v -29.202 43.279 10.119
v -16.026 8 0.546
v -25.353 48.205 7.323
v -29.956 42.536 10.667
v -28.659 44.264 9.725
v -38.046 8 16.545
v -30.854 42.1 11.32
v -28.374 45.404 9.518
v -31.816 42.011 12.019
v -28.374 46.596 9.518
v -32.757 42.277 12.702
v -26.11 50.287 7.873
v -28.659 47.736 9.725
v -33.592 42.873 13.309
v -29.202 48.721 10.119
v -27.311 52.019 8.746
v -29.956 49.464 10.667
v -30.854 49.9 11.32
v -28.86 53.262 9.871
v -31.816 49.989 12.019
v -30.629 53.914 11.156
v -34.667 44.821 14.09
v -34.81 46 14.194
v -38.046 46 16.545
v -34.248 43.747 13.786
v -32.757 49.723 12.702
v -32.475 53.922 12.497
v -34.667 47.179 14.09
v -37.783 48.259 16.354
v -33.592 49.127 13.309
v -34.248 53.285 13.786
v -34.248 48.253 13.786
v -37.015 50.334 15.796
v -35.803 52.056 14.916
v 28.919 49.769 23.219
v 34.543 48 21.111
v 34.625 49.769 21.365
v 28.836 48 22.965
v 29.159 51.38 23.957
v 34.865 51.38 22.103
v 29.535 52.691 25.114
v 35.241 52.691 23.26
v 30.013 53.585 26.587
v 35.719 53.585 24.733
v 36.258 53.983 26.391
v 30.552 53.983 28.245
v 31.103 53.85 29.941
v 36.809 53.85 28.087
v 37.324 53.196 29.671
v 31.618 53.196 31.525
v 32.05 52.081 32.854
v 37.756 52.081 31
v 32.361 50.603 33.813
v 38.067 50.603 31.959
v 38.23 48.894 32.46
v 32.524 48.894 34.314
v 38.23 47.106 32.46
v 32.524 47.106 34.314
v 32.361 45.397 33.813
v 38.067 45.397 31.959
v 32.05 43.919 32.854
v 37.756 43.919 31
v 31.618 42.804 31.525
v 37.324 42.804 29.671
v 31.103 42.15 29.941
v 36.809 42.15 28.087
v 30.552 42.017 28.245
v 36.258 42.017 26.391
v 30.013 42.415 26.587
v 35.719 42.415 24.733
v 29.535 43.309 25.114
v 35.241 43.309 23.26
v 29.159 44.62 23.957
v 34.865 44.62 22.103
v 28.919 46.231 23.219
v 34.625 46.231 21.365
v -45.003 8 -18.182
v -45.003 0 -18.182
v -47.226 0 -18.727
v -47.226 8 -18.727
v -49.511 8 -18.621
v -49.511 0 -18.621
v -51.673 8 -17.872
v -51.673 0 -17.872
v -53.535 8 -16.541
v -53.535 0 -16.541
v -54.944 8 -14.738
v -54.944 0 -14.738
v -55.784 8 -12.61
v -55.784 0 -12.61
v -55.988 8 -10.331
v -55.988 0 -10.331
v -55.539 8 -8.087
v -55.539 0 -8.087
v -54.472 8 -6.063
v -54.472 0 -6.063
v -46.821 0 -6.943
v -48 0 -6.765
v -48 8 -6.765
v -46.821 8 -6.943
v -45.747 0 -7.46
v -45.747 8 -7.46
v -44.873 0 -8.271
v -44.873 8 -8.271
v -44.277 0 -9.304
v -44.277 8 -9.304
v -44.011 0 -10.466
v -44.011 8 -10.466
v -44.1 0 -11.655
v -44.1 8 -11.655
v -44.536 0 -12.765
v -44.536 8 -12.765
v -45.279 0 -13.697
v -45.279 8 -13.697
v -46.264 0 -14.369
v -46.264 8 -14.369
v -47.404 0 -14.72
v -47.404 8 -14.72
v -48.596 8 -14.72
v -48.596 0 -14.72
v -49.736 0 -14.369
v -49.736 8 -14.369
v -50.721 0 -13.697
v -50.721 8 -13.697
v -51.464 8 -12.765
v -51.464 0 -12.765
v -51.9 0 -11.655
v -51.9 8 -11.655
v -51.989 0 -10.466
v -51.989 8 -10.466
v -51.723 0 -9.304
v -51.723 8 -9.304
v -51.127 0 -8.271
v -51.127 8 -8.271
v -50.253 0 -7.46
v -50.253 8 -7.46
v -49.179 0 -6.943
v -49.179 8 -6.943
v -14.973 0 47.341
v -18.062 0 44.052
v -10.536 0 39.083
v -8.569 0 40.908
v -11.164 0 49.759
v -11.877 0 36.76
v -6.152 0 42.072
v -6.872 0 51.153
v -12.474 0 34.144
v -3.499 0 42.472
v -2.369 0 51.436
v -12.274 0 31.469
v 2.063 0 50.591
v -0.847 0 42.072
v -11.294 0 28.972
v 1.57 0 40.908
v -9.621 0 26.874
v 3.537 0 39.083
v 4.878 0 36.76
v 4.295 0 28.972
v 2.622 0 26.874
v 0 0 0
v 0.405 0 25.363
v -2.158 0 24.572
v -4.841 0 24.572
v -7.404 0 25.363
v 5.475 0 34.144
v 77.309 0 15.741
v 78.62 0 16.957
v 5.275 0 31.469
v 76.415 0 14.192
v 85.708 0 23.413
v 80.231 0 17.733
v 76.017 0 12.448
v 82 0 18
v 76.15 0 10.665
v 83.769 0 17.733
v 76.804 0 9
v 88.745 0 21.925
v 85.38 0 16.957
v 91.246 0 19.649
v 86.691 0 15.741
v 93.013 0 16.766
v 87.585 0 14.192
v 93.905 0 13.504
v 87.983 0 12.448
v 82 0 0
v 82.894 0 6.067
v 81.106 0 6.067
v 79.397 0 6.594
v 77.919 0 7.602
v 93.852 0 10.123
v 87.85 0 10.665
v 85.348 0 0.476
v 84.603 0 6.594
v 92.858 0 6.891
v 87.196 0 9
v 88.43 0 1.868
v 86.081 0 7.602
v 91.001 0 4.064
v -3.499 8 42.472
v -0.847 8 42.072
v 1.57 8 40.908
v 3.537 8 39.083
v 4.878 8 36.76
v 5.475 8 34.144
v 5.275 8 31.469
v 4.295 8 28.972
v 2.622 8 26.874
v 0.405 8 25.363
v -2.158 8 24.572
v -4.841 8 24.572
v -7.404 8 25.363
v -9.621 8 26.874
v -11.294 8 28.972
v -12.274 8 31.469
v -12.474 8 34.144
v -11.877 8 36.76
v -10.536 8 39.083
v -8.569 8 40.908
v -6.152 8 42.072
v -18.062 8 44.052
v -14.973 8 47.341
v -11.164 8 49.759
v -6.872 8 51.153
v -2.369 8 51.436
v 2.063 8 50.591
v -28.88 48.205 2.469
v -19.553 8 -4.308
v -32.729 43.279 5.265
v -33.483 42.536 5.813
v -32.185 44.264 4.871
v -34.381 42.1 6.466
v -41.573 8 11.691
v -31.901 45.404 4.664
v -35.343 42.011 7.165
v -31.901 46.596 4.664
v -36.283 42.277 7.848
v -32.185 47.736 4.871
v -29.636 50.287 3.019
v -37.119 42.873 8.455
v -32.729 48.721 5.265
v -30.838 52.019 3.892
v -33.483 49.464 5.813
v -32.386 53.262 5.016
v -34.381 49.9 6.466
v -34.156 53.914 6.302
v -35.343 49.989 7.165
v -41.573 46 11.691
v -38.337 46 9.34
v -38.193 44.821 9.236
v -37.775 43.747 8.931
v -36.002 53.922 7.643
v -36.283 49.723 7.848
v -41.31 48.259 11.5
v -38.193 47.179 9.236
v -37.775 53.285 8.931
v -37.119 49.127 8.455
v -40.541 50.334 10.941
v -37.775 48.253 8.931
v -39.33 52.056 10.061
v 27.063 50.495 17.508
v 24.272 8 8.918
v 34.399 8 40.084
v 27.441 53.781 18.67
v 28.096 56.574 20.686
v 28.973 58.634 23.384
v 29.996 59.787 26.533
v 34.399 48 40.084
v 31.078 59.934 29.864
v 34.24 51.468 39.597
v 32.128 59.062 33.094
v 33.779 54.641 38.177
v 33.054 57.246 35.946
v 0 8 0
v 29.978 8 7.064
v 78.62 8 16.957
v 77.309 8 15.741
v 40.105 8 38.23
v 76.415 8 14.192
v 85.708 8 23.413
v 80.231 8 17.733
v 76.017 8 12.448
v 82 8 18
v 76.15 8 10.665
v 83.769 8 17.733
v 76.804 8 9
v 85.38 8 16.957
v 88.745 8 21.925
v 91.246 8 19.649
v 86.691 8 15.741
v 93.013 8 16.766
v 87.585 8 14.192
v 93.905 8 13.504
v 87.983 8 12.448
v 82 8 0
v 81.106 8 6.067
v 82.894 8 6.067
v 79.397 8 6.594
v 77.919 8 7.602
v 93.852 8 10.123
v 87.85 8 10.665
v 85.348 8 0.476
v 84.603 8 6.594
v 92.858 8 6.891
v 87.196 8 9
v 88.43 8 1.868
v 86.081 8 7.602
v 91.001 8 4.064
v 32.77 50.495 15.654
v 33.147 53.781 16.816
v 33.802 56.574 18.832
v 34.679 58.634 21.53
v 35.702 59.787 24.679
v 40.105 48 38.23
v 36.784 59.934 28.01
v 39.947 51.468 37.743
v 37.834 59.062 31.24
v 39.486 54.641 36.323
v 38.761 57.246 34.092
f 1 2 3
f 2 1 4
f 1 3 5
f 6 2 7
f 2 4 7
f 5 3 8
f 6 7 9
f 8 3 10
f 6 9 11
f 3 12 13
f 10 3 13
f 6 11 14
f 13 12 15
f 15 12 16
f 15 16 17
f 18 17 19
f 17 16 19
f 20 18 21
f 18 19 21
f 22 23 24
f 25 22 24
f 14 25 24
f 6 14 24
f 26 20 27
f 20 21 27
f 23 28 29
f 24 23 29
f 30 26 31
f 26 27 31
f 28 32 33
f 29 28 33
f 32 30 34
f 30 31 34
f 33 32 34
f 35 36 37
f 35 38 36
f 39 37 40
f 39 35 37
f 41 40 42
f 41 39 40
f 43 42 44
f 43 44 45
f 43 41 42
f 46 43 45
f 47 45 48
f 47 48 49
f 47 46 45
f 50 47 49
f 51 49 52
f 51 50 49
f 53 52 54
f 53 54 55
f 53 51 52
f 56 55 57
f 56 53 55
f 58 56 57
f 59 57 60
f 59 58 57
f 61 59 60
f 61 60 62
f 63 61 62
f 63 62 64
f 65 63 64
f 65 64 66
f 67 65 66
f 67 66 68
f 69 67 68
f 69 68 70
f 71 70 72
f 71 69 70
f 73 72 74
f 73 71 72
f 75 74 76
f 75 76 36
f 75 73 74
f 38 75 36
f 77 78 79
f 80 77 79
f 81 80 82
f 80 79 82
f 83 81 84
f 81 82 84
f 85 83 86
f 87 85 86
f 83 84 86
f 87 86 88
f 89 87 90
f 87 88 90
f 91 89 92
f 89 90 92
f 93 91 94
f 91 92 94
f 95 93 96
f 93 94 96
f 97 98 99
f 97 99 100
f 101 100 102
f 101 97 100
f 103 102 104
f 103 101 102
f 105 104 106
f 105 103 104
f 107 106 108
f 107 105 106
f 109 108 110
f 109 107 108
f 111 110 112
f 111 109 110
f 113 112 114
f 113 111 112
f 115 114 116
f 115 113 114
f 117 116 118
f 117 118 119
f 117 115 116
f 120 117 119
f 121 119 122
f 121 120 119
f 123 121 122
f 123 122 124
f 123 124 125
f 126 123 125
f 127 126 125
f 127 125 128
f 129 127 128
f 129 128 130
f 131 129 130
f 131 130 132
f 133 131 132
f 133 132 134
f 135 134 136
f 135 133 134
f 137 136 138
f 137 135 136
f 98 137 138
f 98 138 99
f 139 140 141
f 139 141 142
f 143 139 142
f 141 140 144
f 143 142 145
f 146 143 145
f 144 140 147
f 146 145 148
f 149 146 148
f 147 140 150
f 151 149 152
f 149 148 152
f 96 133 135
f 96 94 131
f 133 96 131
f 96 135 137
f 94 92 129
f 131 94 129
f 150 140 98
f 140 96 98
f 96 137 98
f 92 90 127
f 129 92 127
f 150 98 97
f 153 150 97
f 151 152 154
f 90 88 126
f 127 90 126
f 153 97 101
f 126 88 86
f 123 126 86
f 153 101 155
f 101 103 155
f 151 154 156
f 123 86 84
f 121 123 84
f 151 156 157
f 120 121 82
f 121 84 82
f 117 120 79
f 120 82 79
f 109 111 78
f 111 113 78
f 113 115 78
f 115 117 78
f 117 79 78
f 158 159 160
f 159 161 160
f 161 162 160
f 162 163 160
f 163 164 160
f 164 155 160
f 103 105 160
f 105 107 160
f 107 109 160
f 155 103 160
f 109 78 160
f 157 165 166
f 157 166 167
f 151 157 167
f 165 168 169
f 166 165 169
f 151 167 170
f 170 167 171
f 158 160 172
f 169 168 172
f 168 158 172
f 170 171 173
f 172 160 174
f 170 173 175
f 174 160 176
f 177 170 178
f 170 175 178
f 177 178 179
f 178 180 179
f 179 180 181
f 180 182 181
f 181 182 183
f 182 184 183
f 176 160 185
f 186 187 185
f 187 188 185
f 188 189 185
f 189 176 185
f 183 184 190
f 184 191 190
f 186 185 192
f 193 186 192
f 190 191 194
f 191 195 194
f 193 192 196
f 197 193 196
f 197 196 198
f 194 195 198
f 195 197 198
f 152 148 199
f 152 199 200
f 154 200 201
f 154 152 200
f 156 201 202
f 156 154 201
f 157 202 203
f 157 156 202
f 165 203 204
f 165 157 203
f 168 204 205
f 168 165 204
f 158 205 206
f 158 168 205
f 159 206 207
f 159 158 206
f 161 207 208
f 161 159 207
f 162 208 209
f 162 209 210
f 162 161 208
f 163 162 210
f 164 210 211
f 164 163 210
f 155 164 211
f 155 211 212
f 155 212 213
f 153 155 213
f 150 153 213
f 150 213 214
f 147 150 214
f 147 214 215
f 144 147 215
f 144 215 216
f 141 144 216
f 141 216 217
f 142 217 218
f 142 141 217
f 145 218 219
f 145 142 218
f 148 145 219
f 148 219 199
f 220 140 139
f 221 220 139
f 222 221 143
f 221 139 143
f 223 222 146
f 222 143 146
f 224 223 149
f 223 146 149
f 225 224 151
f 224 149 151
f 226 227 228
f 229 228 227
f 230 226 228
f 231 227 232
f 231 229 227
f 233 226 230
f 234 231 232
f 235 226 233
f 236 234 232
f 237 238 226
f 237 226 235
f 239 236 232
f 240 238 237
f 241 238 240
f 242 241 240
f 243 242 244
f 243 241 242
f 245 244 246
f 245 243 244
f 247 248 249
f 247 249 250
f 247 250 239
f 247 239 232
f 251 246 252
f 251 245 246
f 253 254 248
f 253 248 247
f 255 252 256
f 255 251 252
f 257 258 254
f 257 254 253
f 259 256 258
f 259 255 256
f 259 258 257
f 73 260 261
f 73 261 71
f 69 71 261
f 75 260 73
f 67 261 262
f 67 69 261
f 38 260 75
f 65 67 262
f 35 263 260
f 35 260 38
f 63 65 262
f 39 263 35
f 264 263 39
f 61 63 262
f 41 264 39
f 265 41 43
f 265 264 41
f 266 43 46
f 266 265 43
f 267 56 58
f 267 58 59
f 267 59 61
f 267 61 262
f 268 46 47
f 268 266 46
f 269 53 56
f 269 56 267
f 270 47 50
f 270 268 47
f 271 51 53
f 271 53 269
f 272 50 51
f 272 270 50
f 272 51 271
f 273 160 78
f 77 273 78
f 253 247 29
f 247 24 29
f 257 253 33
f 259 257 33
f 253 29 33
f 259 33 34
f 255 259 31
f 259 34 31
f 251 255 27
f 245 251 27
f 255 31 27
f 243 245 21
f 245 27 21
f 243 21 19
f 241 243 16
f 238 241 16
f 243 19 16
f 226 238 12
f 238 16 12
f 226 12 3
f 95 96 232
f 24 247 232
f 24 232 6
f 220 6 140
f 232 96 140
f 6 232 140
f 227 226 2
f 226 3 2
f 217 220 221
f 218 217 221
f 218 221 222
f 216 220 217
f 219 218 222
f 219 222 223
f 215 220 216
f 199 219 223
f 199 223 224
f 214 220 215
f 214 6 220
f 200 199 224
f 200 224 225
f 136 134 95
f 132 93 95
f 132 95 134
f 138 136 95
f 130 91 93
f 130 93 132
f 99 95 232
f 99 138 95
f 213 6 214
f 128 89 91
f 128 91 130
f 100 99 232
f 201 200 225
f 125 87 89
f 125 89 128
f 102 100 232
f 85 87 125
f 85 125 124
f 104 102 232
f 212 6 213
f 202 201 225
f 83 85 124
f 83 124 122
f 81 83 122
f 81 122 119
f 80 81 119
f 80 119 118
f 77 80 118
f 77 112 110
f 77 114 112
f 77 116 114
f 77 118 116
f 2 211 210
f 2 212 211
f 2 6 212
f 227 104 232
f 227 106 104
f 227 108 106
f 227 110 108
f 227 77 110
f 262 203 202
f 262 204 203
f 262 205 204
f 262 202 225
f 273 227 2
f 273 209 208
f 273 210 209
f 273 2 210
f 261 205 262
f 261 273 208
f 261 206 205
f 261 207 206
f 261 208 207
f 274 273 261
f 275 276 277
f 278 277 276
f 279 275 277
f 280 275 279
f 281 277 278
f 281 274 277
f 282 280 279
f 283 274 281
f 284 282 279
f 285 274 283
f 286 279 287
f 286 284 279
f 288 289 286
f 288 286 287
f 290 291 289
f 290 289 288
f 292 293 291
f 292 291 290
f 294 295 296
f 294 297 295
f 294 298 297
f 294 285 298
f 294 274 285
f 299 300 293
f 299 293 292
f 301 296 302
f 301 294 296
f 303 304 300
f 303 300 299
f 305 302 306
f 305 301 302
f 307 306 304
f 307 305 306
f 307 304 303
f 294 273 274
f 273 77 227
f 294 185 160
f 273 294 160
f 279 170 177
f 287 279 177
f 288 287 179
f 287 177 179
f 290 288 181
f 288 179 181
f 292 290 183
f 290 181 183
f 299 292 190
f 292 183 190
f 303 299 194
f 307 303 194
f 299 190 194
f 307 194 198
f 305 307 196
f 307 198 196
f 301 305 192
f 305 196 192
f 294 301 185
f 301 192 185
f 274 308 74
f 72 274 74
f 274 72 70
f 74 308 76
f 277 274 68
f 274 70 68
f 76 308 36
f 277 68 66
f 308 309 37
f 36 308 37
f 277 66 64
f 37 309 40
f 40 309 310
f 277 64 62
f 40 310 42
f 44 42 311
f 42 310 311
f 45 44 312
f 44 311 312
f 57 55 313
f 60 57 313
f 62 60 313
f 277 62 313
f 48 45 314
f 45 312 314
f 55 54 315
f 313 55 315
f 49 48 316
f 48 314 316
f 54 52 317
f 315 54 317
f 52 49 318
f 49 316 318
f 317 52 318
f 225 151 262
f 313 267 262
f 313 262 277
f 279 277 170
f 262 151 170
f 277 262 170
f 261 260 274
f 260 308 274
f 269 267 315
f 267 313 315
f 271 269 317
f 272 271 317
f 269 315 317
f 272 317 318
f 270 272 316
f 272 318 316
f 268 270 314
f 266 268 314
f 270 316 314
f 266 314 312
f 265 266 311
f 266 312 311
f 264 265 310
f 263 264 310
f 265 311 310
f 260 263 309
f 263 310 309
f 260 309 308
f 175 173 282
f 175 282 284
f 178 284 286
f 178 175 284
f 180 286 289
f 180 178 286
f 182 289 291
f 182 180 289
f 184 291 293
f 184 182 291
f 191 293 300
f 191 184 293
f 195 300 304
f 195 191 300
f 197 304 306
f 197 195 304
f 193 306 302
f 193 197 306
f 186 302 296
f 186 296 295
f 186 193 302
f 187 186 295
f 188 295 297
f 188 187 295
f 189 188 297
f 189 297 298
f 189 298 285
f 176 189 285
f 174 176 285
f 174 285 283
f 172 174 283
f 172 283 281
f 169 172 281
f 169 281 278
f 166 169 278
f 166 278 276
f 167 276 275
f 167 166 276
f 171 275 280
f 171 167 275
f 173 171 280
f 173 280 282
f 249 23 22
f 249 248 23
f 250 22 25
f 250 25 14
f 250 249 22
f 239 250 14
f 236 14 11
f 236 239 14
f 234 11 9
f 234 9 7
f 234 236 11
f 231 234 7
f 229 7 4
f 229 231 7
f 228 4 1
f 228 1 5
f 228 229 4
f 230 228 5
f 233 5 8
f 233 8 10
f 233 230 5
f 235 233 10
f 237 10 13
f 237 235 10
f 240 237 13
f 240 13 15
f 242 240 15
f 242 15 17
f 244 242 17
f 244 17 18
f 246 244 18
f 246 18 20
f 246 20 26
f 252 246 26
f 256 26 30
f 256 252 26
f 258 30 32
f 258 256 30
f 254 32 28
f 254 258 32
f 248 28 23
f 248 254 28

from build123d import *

# Parameters (mm, degrees)
SKETCH1_R           = 4
SKETCH1_R_2         = 6
SKETCH1_R_3         = 9
BOSS_EXTRUDE1_DEPTH = 8
SKETCH2_R           = 4
BOSS_EXTRUDE2_DEPTH = 3
SKETCH3_R           = 6
BOSS_EXTRUDE3_DEPTH = 3


with BuildPart() as part:
    # Sketch1 → Boss-Extrude1 (new body)
    with BuildSketch(Plane(origin=(0, 0, 0), x_dir=(1, 0, 0), z_dir=(0, 1, 0))):
        with BuildLine():
            Line((82, 0), (0, 0))
            Line((0, 0), (-45.003147253, 18.182451735))
            ThreePointArc((-45.003147253, 18.182451735), (-54.304086029, 15.690272701), (-54.472135955, 6.06269888))
            Line((-54.472135955, 6.06269888), (-18.061799059, -44.051830542))
            ThreePointArc((-18.061799059, -44.051830542), (-9.061799059, -50.590713294), (2.062812738, -50.590713294))
            Line((2.062812738, -50.590713294), (85.708203932, -23.412678196))
            ThreePointArc((85.708203932, -23.412678196), (93.852260087, -10.12278642), (82, 0))
        make_face()
        with Locations(Location((-48, 10.764980899, 0), (0, 0, 270))):
            Circle(SKETCH1_R, mode=Mode.SUBTRACT)
        with Locations(Location((82, -12, 0), (0, 0, 270))):
            Circle(SKETCH1_R_2, mode=Mode.SUBTRACT)
        with Locations(Location((-3.49949316, -33.471696, 0), (0, 0, 270))):
            Circle(SKETCH1_R_3, mode=Mode.SUBTRACT)
    extrude(amount=BOSS_EXTRUDE1_DEPTH)

    # Sketch2 → Boss-Extrude2 (add, symmetric)
    with BuildSketch(Plane(origin=(-7.04036219, 0, -9.690227231), x_dir=(0.809016994374944, 0, -0.5877852522924779), z_dir=(0.5877852522924779, 0, 0.809016994374944))):
        with BuildLine():
            Line((-40.505318717, 8), (-40.505318717, 46))
            ThreePointArc((-40.505318717, 46), (-33.618703524, 53.92214455), (-24.815225149, 48.205098847))
            Line((-24.815225149, 48.205098847), (-13.286598571, 8))
            Line((-13.286598571, 8), (-40.505318717, 8))
        make_face()
        with Locations(Location((-32.505318717, 46, 0), (0, 0, 180))):
            Circle(SKETCH2_R, mode=Mode.SUBTRACT)
    extrude(amount=BOSS_EXTRUDE2_DEPTH, both=True)

    # Sketch3 → Boss-Extrude3 (add, symmetric)
    with BuildSketch(Plane(origin=(22.186685165, 0, -7.208891004), x_dir=(-0.30901699437494223, 0, -0.9510565162951553), z_dir=(0.9510565162951552, 0, -0.3090169943749422))):
        with BuildLine():
            Line((-48.752071734, 8), (-48.752071734, 48))
            ThreePointArc((-48.752071734, 48), (-38.006413293, 59.934262744), (-25.014300525, 50.49494029))
            Line((-25.014300525, 50.49494029), (-15.981722129, 8))
            Line((-15.981722129, 8), (-48.752071734, 8))
        make_face()
        with Locations((-36.752071734, 48)):
            Circle(SKETCH3_R, mode=Mode.SUBTRACT)
    extrude(amount=BOSS_EXTRUDE3_DEPTH, both=True)


solid = part.part
